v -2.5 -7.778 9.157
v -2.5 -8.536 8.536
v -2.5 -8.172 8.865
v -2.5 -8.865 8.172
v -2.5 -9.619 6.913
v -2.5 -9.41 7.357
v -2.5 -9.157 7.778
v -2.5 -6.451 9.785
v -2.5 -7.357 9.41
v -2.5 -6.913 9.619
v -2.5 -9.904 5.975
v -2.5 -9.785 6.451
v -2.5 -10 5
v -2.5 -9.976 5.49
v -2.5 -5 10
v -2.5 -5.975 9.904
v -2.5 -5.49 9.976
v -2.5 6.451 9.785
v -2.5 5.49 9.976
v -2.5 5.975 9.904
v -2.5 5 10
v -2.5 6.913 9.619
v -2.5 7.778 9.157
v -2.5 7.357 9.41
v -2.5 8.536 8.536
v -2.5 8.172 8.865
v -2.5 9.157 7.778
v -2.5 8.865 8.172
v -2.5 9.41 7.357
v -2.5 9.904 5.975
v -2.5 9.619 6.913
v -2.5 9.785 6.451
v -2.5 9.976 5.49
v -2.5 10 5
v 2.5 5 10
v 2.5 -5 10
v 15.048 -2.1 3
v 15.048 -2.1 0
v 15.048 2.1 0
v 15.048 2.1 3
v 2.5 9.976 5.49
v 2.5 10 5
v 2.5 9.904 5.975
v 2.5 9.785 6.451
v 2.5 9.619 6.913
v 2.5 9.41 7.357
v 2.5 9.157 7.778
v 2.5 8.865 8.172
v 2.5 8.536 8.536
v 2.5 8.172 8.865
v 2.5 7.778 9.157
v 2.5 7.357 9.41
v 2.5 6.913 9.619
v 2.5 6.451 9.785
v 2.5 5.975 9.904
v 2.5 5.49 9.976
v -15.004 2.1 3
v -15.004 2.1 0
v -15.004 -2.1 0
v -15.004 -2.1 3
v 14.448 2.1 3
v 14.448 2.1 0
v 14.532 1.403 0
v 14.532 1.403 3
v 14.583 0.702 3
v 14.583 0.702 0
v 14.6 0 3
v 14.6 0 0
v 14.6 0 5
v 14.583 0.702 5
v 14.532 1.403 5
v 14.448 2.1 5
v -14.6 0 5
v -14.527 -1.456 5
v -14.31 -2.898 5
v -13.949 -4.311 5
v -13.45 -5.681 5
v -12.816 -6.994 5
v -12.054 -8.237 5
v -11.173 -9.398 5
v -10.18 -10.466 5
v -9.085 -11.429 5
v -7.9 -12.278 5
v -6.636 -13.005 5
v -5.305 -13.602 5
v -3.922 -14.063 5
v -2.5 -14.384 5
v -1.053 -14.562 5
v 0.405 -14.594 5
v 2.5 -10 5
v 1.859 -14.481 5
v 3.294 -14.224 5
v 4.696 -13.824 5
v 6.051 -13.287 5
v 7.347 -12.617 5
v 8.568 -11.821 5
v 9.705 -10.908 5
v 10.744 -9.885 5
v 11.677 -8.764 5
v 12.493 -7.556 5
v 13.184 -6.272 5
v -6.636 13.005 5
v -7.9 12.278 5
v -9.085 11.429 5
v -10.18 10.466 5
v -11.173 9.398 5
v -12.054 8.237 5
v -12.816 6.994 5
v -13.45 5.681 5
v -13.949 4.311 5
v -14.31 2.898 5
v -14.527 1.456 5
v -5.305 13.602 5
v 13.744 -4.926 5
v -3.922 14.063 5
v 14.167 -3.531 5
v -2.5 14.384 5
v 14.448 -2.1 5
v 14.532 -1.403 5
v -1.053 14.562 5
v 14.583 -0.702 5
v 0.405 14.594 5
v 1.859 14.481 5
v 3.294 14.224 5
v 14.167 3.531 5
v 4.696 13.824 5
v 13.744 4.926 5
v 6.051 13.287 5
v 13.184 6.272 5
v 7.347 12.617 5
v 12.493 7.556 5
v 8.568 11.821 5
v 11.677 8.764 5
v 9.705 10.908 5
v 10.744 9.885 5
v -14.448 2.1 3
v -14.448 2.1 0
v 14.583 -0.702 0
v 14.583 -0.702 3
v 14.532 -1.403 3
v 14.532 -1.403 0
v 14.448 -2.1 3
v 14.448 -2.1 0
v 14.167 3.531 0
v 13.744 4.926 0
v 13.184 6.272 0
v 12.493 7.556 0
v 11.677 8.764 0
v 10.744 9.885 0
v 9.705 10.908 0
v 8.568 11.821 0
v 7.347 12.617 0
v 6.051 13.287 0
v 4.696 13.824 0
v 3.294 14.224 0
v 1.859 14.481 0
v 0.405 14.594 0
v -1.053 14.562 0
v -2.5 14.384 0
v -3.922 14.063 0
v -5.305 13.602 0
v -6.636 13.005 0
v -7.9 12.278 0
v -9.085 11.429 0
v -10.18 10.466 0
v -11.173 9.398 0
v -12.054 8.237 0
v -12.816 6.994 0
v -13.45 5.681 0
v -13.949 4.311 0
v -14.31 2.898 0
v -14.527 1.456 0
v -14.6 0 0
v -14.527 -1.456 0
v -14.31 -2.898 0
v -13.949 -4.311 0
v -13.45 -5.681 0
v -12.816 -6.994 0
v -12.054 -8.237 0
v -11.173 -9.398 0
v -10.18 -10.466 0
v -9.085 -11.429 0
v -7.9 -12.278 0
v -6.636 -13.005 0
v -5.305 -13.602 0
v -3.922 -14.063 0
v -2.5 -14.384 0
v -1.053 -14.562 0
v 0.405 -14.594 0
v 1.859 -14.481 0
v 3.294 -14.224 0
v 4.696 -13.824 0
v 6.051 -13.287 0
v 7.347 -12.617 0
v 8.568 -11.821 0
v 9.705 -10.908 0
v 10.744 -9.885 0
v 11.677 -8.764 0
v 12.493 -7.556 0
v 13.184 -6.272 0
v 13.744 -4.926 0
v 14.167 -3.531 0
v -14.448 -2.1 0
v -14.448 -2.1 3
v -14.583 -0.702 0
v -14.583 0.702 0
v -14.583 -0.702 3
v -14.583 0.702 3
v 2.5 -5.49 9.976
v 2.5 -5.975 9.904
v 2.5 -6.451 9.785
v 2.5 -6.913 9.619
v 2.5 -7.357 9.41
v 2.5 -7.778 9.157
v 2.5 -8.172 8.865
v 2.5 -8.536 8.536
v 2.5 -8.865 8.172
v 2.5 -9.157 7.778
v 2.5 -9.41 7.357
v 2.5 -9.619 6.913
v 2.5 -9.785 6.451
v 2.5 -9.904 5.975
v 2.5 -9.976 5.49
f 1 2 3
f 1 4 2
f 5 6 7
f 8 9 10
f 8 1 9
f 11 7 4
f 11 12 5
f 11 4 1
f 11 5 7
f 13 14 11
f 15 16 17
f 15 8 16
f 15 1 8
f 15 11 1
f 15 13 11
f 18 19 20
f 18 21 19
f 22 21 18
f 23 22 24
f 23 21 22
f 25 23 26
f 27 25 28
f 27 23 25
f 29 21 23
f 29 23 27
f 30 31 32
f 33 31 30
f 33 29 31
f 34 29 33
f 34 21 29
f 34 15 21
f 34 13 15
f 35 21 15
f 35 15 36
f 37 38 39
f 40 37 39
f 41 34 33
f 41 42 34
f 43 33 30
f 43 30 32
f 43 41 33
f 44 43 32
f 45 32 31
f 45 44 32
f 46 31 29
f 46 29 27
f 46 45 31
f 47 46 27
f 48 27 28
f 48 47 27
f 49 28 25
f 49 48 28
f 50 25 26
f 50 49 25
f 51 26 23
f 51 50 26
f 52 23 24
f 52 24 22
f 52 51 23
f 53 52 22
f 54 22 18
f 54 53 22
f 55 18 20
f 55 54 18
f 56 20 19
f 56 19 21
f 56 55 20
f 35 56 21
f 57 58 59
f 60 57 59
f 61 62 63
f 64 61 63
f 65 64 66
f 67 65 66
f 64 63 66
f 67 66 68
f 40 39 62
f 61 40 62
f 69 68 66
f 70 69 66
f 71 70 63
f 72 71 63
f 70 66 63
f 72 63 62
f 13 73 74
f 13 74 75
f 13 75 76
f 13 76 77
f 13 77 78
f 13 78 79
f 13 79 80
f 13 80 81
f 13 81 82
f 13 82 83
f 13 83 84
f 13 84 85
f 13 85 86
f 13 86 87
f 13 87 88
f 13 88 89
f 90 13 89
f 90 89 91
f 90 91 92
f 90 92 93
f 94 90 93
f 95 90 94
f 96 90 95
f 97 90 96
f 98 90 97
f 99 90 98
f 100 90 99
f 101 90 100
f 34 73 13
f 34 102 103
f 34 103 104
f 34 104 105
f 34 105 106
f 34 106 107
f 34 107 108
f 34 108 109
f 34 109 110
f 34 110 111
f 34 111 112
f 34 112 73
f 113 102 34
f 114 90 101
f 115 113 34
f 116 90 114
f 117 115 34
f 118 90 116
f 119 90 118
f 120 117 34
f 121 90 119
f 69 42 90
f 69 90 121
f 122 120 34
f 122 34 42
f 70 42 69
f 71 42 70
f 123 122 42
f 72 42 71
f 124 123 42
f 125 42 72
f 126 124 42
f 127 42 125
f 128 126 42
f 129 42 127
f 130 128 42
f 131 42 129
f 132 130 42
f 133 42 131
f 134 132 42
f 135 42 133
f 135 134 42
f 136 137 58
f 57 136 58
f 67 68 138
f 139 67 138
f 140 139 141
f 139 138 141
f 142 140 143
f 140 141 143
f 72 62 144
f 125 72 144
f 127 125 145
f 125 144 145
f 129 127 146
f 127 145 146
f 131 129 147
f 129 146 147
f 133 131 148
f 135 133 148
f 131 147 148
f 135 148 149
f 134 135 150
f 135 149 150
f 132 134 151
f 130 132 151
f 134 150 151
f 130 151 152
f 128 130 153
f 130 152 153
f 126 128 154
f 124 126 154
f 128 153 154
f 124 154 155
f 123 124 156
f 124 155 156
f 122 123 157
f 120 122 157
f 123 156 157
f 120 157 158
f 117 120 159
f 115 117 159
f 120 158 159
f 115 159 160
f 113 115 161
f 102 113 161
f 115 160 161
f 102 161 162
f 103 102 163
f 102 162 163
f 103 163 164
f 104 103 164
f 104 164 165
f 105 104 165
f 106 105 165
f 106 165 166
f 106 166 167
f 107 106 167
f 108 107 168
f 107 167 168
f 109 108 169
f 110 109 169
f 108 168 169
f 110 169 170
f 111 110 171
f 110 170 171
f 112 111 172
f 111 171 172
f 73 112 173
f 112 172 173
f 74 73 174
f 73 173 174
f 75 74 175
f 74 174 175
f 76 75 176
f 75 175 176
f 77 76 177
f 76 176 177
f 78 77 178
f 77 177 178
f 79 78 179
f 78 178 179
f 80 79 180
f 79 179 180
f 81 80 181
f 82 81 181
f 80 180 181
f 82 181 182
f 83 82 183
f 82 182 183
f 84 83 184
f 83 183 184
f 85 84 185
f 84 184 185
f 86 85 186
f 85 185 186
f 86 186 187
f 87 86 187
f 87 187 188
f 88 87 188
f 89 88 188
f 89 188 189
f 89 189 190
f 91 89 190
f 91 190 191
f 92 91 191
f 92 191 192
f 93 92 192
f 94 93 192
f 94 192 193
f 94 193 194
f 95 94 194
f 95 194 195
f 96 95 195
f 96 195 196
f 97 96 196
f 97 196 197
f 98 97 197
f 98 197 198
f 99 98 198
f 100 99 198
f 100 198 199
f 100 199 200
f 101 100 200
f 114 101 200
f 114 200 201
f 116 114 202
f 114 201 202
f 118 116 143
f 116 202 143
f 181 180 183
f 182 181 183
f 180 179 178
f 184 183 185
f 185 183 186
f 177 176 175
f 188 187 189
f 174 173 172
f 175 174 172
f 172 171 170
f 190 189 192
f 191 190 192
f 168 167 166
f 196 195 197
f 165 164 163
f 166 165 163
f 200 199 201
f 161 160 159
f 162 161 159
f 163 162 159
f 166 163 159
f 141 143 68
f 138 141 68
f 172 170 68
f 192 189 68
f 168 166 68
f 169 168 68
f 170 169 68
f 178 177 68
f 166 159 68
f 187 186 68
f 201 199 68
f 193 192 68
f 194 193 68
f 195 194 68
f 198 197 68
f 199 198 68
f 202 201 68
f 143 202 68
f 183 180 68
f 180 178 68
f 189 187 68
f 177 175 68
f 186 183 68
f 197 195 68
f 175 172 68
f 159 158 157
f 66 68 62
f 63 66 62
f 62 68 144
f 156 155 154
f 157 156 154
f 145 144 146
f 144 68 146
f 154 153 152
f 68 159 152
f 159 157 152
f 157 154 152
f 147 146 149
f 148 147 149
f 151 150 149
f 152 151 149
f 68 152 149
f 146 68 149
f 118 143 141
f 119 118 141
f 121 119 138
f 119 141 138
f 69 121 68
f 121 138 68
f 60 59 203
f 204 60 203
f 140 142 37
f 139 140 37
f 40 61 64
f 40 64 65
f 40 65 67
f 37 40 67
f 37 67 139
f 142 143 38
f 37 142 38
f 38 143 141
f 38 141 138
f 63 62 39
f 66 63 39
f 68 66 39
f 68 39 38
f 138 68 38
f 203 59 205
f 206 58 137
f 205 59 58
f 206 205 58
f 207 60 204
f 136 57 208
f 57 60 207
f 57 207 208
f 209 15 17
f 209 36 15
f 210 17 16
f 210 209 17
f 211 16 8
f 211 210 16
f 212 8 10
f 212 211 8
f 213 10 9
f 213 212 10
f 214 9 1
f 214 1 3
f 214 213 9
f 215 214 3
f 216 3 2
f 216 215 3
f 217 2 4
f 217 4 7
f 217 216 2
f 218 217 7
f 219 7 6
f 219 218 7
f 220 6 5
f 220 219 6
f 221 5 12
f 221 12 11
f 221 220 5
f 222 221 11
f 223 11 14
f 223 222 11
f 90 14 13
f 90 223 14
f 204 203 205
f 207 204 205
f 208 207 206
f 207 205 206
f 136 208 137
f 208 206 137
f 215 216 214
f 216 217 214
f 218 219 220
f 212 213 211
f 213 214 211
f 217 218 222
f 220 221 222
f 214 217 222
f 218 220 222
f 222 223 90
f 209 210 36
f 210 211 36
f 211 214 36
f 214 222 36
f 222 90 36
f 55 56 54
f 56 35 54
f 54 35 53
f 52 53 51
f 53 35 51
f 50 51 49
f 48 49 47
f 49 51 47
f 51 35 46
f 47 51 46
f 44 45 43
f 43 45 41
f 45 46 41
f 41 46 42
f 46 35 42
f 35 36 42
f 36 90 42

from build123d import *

# Parameters (mm, degrees)
F0_W     = 5
F0_H     = 20
F1_DEPTH = 5
F2_DEPTH = 3
F3_DEPTH = 10
F4_R     = 4.99999


# Not quite as in the source:
# - a fillet or chamfer is up to 0.001 mm smaller than in the source, because OpenCascade refuses the exact size


with BuildPart() as f1:
    # F0 (on Top) → F1 (new body)
    with BuildSketch(Plane.XY):
        with BuildLine():
            Line((14.4481832768, -2.1), (14.4481832768, 2.1))
            ThreePointArc((14.4481832768, 2.1), (0, 14.6), (-14.4481832768, 2.1))
            Line((-14.4481832768, 2.1), (-14.4037672862, 2.1))
            Line((-14.4037672862, 2.1), (-14.4037672862, -2.1))
            Line((-14.4037672862, -2.1), (-14.4481832768, -2.1))
            ThreePointArc((-14.4481832768, -2.1), (0, -14.6), (14.4481832768, -2.1))
        make_face()
        Rectangle(F0_W, F0_H, mode=Mode.SUBTRACT)
        with BuildLine():
            ThreePointArc((14.4481832768, -2.1), (14.5619963577, -1.0527402716), (14.6, 0))
            ThreePointArc((14.6, 0), (14.5619963577, 1.0527402716), (14.4481832768, 2.1))
            Line((14.4481832768, 2.1), (14.4481832768, -2.1))
        make_face()
        with BuildLine():
            Line((-14.4037672862, 2.1), (-14.4481832768, 2.1))
            ThreePointArc((-14.4481832768, 2.1), (-14.6, 0), (-14.4481832768, -2.1))
            Line((-14.4481832768, -2.1), (-14.4037672862, -2.1))
            Line((-14.4037672862, -2.1), (-14.4037672862, 2.1))
        make_face()
    extrude(amount=F1_DEPTH)

    # F0 (on Top) → F3 (join)
    with BuildSketch(Plane.XY):
        Rectangle(F0_W, F0_H)
    extrude(amount=F3_DEPTH)

    # F4 (radius 5 in the source; OpenCascade refuses exactly that, so slightly less here)
    f4_edges = [f1.edges().sort_by_distance(p)[0] for p in [
        (0, 10, 10),
        (0, -10, 10),
    ]]
    fillet(f4_edges, radius=F4_R)


with BuildPart() as f2:
    # F0 (on Top) → F2 (new body)
    with BuildSketch(Plane.XY):
        with BuildLine():
            ThreePointArc((-14.4481832768, -2.1), (-14.6, 0), (-14.4481832768, 2.1))
            Line((-14.4481832768, 2.1), (-15.0037672862, 2.1))
            Line((-15.0037672862, 2.1), (-15.0037672862, -2.1))
            Line((-15.0037672862, -2.1), (-14.4481832768, -2.1))
        make_face()
    extrude(amount=F2_DEPTH)


with BuildPart() as f2b:
    # F0 (on Top) → F2, piece 2 (new body)
    with BuildSketch(Plane.XY):
        with BuildLine():
            ThreePointArc((14.4481832768, 2.1), (14.5619963577, 1.0527402716), (14.6, 0))
            ThreePointArc((14.6, 0), (14.5619963577, -1.0527402716), (14.4481832768, -2.1))
            Line((14.4481832768, -2.1), (15.0481832768, -2.1))
            Line((15.0481832768, -2.1), (15.0481832768, 2.1))
            Line((15.0481832768, 2.1), (14.4481832768, 2.1))
        make_face()
    extrude(amount=F2_DEPTH)


solid = Compound([f1.part, f2.part, f2b.part])
